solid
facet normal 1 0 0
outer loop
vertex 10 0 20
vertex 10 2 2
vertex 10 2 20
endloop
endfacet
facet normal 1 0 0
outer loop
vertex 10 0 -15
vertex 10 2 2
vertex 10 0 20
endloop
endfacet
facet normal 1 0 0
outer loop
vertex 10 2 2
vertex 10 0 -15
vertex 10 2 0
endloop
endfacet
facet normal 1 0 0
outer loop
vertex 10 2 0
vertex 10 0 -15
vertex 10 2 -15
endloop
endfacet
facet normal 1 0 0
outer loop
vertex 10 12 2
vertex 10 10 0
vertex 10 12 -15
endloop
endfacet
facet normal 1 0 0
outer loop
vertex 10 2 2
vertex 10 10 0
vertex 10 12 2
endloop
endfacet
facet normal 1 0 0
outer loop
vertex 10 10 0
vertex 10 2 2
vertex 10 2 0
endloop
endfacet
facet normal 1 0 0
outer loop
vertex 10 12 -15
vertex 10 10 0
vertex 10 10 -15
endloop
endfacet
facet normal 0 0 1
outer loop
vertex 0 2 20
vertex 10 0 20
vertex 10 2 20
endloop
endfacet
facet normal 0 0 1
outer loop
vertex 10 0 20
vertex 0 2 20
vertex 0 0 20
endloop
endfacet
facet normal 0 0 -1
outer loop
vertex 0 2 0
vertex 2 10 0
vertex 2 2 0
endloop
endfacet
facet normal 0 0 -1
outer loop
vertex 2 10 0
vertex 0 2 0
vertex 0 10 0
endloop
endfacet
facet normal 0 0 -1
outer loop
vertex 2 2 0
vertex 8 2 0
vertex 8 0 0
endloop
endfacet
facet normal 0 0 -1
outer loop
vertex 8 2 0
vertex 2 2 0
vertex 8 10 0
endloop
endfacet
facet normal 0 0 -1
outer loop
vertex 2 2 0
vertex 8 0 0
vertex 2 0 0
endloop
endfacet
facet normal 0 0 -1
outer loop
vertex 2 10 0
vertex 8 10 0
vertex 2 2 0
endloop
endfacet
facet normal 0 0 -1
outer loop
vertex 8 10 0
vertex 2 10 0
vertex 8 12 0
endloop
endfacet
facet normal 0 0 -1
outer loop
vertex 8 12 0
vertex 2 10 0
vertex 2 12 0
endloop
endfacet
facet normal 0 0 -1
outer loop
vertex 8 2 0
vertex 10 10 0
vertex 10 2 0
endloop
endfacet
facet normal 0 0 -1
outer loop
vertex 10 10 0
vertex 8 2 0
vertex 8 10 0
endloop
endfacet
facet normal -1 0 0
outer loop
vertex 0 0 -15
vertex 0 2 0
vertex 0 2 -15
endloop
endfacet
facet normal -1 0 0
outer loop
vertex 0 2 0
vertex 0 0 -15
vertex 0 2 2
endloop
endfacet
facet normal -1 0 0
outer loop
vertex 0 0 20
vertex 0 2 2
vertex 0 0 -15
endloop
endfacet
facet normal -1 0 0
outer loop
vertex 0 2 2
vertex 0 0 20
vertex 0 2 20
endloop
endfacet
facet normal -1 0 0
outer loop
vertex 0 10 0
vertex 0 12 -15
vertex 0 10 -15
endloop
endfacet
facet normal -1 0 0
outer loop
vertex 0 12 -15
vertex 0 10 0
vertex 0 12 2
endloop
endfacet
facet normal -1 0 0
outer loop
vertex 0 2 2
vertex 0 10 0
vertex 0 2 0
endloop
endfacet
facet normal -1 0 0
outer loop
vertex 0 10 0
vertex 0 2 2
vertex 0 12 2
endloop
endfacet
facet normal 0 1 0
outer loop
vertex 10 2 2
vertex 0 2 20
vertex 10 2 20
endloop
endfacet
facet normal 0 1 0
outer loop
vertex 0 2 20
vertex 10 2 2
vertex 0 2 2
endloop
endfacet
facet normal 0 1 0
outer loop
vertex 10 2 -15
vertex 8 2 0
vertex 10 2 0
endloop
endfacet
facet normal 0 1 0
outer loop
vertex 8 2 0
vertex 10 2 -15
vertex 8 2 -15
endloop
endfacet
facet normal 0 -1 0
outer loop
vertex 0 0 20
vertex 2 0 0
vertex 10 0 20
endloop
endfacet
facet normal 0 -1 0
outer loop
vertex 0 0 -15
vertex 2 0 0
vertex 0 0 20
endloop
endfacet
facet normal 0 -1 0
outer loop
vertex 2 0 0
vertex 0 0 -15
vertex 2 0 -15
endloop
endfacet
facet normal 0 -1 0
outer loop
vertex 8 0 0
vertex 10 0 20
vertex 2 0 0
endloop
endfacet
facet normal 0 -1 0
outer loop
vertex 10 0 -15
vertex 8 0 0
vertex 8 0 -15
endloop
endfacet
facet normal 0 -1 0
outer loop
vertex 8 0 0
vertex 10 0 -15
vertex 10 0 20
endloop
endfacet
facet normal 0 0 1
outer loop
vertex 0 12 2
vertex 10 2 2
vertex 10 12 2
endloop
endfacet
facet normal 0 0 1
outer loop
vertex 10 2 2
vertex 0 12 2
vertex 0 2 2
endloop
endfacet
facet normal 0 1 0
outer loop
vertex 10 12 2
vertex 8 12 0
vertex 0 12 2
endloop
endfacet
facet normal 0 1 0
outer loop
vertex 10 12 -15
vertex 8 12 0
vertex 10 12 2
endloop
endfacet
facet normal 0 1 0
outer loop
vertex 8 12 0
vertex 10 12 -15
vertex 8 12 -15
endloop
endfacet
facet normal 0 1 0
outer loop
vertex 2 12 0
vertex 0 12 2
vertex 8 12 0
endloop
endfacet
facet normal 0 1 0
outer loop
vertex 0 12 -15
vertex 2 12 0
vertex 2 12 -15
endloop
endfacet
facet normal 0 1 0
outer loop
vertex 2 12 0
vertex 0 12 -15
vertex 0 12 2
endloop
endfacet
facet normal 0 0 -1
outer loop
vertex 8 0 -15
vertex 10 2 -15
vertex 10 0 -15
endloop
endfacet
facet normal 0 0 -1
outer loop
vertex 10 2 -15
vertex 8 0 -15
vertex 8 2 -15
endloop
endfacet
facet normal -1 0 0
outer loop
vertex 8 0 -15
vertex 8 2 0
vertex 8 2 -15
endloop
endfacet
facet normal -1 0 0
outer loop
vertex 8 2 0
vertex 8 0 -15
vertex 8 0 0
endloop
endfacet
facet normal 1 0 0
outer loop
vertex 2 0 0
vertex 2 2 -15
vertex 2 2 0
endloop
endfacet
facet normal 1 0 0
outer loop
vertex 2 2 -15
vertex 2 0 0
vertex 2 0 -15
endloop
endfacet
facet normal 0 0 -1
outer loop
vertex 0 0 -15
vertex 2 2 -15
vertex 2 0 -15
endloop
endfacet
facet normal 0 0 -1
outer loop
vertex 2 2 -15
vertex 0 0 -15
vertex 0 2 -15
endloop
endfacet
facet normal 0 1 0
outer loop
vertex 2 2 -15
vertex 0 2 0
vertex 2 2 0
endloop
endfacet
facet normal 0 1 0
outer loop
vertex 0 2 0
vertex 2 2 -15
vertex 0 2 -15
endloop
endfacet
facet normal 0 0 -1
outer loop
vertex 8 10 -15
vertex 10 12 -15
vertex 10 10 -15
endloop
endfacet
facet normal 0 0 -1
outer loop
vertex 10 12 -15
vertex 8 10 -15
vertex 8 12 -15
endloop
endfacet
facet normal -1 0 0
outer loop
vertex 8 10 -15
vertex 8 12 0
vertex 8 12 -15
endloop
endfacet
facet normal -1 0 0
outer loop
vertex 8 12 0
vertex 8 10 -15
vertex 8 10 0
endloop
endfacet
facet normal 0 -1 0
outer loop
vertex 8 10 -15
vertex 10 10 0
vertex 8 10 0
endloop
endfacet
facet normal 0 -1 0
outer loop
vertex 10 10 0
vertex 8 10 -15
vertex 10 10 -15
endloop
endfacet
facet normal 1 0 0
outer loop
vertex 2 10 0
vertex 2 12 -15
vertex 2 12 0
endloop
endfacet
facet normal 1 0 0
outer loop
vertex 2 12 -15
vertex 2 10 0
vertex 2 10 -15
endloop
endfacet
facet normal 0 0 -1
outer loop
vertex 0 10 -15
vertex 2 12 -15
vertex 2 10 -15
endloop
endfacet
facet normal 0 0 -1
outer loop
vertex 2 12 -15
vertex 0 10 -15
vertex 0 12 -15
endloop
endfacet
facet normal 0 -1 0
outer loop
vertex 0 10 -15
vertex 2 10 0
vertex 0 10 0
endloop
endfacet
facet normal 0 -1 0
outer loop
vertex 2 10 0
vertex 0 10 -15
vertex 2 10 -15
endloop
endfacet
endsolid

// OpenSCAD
cube([10,2,20]);
translate([0,0,0])cube([10,12,2]);
translate([8,-0,-15])cube([2,2,15]);
translate([0,0,-15])cube([2,2,15]);
translate([8,10,-15])cube([2,2,15]);
translate([0,10,-15])cube([2,2,15]);
